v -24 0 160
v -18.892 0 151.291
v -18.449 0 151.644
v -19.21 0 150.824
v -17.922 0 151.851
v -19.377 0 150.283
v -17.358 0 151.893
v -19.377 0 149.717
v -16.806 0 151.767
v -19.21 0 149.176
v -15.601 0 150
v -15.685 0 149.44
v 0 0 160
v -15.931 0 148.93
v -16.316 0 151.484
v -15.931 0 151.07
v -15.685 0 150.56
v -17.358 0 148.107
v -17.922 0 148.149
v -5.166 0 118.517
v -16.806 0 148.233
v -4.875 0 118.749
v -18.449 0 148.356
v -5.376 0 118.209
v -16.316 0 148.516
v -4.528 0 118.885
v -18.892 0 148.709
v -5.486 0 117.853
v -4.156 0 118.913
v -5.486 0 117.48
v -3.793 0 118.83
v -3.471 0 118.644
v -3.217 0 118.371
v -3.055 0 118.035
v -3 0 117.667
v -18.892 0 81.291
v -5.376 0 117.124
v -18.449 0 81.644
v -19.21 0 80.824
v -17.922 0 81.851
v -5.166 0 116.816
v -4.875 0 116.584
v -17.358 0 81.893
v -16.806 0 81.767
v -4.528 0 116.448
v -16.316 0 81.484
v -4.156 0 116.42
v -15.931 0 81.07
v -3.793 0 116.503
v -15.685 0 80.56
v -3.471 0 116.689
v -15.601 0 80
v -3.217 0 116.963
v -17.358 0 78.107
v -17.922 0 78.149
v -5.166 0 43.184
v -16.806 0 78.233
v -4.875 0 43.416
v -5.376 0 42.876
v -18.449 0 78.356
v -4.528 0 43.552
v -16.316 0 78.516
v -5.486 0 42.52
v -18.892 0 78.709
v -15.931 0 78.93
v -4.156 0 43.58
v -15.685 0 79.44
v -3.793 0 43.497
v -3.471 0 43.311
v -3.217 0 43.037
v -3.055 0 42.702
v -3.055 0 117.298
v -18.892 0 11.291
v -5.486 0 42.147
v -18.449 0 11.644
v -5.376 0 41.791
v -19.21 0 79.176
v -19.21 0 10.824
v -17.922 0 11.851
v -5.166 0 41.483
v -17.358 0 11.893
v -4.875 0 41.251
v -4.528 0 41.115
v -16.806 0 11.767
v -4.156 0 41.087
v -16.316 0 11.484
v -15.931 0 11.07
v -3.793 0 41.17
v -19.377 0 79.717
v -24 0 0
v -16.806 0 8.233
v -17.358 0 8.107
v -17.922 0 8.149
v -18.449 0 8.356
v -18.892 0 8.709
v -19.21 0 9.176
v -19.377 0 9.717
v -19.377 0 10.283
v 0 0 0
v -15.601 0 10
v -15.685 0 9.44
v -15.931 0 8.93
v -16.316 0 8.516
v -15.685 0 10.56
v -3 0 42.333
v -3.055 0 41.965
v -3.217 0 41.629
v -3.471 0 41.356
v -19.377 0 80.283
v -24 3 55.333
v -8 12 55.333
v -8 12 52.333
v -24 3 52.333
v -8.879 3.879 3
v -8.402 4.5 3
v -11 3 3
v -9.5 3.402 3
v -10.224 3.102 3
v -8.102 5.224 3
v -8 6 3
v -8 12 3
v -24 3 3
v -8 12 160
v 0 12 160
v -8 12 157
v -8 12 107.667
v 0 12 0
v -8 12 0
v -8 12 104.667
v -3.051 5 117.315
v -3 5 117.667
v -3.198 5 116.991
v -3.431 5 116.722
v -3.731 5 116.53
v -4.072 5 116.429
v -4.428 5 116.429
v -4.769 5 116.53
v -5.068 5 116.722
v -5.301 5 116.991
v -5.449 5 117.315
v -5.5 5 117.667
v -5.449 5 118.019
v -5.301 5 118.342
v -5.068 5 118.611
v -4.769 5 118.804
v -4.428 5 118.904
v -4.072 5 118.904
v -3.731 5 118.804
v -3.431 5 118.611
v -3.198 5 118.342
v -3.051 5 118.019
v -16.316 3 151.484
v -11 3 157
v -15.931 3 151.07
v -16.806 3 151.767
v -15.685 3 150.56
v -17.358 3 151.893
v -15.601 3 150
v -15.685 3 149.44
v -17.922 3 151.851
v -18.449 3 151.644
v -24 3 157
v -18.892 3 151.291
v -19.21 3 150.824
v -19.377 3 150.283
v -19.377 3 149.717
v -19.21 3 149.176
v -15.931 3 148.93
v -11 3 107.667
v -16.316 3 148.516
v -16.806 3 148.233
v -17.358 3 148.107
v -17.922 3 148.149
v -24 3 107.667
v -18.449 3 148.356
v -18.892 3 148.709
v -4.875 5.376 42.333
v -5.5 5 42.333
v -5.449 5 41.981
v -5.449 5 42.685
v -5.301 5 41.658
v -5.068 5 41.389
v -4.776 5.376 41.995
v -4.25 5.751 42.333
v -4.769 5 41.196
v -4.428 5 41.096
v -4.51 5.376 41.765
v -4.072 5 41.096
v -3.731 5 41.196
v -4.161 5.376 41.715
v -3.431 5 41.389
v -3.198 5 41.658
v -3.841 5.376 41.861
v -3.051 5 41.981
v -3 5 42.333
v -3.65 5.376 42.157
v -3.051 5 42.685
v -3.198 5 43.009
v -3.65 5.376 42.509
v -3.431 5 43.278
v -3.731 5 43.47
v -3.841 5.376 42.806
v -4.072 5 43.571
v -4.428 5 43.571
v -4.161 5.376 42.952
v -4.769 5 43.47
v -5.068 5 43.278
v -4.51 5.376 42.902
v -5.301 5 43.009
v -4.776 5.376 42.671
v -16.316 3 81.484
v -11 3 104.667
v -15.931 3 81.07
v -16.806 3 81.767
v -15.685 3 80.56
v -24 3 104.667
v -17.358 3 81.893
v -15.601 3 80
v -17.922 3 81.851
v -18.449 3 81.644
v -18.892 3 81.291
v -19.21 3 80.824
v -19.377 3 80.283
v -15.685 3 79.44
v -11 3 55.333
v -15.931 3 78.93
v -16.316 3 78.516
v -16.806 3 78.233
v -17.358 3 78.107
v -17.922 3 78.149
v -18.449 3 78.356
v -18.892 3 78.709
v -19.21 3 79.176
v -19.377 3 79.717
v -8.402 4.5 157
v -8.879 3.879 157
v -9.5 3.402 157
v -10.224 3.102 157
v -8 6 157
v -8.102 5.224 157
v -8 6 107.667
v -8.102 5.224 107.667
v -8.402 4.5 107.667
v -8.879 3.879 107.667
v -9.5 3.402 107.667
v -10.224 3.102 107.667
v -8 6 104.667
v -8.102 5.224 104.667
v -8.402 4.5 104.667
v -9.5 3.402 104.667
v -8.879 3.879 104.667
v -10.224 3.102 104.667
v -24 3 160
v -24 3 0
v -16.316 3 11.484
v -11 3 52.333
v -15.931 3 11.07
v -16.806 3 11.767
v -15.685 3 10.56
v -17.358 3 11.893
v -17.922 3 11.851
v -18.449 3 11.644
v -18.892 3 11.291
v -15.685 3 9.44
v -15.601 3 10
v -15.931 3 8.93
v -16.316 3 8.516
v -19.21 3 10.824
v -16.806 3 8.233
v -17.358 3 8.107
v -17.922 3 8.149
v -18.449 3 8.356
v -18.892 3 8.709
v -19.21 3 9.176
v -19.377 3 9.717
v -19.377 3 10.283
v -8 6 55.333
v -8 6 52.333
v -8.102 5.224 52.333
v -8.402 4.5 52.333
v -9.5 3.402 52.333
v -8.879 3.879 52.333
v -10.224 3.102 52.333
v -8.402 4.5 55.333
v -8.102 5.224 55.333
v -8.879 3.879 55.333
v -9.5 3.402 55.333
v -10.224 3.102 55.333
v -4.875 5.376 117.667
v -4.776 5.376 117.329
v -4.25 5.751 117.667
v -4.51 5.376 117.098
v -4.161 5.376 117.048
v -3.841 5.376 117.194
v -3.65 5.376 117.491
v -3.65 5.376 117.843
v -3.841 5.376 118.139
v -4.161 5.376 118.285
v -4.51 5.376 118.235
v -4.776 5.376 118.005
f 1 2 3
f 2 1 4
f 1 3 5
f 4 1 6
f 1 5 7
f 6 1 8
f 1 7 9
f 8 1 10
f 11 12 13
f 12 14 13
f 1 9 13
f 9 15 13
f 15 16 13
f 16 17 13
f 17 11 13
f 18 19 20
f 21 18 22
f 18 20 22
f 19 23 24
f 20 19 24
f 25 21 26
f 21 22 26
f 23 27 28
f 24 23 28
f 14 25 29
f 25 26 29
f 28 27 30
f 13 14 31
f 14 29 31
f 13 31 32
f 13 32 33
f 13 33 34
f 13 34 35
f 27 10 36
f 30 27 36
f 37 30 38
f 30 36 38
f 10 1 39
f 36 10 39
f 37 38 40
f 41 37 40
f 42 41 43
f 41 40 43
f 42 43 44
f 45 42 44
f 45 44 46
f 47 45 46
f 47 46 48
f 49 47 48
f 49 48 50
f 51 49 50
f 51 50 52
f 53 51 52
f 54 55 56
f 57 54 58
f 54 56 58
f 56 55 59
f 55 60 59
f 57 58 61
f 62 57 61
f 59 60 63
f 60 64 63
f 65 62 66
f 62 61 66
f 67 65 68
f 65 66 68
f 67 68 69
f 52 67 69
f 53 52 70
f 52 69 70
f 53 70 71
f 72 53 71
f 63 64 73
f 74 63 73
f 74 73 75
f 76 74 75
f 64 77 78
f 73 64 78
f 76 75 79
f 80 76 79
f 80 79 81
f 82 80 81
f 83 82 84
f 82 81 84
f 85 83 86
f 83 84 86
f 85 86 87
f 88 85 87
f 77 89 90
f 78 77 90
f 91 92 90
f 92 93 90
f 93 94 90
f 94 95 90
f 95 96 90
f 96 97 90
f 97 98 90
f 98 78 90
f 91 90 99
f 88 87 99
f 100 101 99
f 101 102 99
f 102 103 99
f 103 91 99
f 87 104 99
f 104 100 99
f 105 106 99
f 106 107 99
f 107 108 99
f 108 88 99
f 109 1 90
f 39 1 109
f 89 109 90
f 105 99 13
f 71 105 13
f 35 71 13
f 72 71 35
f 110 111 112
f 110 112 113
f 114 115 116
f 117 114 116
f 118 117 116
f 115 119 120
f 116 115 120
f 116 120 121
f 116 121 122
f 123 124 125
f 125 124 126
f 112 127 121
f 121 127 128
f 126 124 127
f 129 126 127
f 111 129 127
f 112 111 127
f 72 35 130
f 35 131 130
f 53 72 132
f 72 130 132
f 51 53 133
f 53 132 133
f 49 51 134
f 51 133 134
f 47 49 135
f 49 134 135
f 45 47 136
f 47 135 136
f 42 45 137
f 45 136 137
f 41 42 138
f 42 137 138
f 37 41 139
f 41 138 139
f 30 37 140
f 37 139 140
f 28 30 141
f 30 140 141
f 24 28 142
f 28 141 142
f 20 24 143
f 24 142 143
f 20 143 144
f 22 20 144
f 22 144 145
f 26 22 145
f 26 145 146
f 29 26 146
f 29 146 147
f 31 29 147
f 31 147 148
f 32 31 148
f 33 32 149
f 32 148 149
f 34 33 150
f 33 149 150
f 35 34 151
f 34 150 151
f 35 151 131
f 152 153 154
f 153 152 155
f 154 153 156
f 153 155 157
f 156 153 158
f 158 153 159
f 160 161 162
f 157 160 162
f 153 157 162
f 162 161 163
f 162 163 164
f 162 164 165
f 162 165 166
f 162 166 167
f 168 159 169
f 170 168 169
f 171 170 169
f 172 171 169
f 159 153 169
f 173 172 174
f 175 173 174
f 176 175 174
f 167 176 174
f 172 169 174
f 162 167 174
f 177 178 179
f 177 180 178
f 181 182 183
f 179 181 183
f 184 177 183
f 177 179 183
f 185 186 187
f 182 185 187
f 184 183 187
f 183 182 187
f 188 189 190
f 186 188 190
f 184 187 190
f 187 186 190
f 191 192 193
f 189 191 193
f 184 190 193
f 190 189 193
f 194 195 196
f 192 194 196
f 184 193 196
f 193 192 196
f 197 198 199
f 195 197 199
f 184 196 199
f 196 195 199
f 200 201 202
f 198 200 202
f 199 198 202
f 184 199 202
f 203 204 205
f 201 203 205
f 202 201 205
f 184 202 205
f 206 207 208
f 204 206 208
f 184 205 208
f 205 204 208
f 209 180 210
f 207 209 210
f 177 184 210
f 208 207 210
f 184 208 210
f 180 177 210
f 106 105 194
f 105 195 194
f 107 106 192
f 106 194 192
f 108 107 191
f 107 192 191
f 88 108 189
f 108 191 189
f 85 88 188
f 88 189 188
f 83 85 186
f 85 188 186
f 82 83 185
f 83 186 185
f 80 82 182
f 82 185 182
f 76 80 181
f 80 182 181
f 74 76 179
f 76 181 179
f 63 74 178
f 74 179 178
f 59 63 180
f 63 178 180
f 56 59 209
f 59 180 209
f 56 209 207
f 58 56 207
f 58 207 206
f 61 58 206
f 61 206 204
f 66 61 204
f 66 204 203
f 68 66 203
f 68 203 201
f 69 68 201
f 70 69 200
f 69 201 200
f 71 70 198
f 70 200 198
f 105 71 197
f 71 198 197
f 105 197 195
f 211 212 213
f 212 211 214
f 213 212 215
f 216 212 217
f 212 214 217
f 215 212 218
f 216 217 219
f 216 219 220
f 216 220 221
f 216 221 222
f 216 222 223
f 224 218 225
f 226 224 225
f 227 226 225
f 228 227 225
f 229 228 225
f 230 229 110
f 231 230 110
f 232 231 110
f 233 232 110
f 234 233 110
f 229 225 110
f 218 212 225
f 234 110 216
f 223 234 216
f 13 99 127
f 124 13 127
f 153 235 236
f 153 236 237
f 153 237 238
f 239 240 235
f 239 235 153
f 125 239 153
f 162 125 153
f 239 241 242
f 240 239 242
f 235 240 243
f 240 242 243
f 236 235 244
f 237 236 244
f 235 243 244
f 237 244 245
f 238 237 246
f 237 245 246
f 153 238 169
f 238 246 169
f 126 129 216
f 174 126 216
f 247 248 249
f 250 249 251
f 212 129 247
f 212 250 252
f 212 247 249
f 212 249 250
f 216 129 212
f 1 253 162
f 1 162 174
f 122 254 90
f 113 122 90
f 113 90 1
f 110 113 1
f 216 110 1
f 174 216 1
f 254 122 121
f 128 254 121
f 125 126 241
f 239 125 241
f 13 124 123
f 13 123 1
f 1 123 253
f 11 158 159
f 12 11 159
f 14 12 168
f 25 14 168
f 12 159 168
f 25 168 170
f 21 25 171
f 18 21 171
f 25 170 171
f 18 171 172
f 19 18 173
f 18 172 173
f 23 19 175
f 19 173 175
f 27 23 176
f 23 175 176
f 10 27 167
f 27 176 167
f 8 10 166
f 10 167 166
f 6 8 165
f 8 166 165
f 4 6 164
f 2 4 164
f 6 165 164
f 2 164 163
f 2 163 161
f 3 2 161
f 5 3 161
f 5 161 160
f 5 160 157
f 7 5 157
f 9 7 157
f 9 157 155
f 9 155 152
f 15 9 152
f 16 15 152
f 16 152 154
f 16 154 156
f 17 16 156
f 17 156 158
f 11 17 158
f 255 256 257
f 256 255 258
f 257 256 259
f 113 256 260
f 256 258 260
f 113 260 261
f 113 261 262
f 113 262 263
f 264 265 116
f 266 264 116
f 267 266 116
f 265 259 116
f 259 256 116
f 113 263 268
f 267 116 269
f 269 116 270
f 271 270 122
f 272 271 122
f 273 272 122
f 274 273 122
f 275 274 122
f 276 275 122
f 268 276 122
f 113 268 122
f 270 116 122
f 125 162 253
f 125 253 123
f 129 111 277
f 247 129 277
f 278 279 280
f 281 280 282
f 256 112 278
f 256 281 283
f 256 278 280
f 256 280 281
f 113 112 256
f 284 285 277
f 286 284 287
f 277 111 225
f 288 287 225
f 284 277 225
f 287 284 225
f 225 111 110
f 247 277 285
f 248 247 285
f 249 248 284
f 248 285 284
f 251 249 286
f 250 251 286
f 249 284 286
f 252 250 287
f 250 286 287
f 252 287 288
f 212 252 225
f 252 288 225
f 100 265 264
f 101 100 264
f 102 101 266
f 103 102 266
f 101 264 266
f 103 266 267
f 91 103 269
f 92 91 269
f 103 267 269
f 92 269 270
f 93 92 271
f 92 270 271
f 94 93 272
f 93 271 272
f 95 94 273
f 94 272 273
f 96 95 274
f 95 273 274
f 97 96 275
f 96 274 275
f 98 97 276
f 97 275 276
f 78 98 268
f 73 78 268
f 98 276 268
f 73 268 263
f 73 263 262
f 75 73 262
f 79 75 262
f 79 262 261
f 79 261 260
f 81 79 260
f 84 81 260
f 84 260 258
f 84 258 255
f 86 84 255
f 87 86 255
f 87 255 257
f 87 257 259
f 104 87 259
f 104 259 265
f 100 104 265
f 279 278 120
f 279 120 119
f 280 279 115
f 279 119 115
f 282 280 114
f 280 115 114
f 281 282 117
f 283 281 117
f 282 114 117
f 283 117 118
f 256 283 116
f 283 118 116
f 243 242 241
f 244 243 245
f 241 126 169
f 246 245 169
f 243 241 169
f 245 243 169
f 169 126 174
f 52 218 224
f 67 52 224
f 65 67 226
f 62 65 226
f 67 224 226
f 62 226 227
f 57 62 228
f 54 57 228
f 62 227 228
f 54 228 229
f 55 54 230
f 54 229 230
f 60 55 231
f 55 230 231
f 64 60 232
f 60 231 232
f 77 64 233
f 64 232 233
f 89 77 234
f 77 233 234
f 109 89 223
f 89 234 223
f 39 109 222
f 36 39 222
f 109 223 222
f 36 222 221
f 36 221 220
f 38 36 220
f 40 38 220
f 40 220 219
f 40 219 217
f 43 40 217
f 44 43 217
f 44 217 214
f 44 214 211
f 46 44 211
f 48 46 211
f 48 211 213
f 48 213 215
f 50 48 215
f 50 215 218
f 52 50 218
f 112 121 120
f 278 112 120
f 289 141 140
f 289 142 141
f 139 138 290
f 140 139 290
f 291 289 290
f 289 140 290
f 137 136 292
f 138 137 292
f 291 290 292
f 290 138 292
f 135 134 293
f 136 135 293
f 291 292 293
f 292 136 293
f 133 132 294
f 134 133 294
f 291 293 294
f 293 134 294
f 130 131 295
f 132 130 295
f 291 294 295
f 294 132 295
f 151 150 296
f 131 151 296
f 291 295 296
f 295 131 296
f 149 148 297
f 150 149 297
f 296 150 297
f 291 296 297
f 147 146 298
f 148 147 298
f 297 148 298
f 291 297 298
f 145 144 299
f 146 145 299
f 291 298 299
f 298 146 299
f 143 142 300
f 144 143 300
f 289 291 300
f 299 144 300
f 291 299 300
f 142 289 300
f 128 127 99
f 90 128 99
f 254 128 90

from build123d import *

# Parameters (mm, degrees)
BOSS_EXTRUDE1_DEPTH             = 160
RIB3_REACH                      = 111.505
SKETCH4_WALL_W                  = 239.367706636
SKETCH4_WALL_H                  = 3
RIB4_REACH                      = 164.234
SKETCH5_WALL_W                  = 344.826356402
SKETCH5_WALL_H                  = 3
F_6_CLEARANCE_HOLE1_D           = 3.7973
TAP_DRILL_FOR_M3X0_5_TAP1_D     = 2.5
TAP_DRILL_FOR_M3X0_5_TAP1_DEPTH = 5
TAP_DRILL_FOR_M3X0_5_TAP1_TIP   = 0.751075774


with BuildPart() as part:
    # Sketch1 → Boss-Extrude1 (new body)
    with BuildSketch(Plane.XY):
        with BuildLine():
            Line((0, 0), (0, 12))
            Line((0, 12), (-8, 12))
            Line((-8, 12), (-8, 6))
            ThreePointArc((-8, 6), (-8.878679656, 3.878679656), (-11, 3))
            Line((-11, 3), (-24, 3))
            Line((-24, 3), (-24, 0))
            Line((-24, 0), (0, 0))
        make_face()
    extrude(amount=BOSS_EXTRUDE1_DEPTH)

    # Sketch4 wall → Rib3 (add, up to next)
    with BuildSketch(Plane(origin=(-16, 7.5, 53.83333334), x_dir=(-0.871575537125, -0.490261239633, 0), z_dir=(-0.490261239633, 0.871575537125, 0)), mode=Mode.PRIVATE) as rib3_sk1:
        Rectangle(SKETCH4_WALL_W, SKETCH4_WALL_H)
    rib3_tool1 = extrude(rib3_sk1.sketch, amount=-RIB3_REACH, mode=Mode.PRIVATE) - part.part
    rib3 = rib3_tool1.solids().sort_by_distance((-16, 7.5, 53.83333334))[0]
    add(rib3)

    # Sketch5 wall → Rib4 (add, up to next)
    with BuildSketch(Plane(origin=(-16, 7.5, 0), x_dir=(-0.871575537125, -0.490261239633, 0), z_dir=(-0.490261239633, 0.871575537125, 0)), mode=Mode.PRIVATE) as rib4_sk1:
        with Locations((0, 1.5)):
            Rectangle(SKETCH5_WALL_W, SKETCH5_WALL_H)
    rib4_tool1 = extrude(rib4_sk1.sketch, amount=-RIB4_REACH, mode=Mode.PRIVATE) - part.part
    rib4 = rib4_tool1.solids().sort_by_distance((-16, 7.5, 0))[0]
    add(rib4)

    # Mirror1: Rib3, Rib4 across plane
    add(rib3.mirror(Plane(origin=(0, 0, 80), x_dir=(1, 0, 0), z_dir=(0, 0, -1))))
    add(rib4.mirror(Plane(origin=(0, 0, 80), x_dir=(1, 0, 0), z_dir=(0, 0, -1))))

    # #6 Clearance Hole1 (through all)
    with Locations(Plane(origin=(0, 0, 0), x_dir=(-1, 0, 0), z_dir=(0, -1, 0))):
        with Locations((17.49975, -10), (17.49975, -80), (17.49975, -150)):
            Hole(F_6_CLEARANCE_HOLE1_D / 2)

    # Tap Drill for M3x0.5 Tap1
    with Locations(Plane(origin=(0, 0, 0), x_dir=(-1, 0, 0), z_dir=(0, -1, 0))):
        with Locations((4.249875, -42.33333334), (4.249875, -117.66666666)):
            Hole(TAP_DRILL_FOR_M3X0_5_TAP1_D / 2, depth=TAP_DRILL_FOR_M3X0_5_TAP1_DEPTH)
            with Locations((0, 0, -(TAP_DRILL_FOR_M3X0_5_TAP1_DEPTH + TAP_DRILL_FOR_M3X0_5_TAP1_TIP / 2))):  # 118° drill point
                Cone(0, TAP_DRILL_FOR_M3X0_5_TAP1_D / 2, TAP_DRILL_FOR_M3X0_5_TAP1_TIP, mode=Mode.SUBTRACT)


solid = part.part
